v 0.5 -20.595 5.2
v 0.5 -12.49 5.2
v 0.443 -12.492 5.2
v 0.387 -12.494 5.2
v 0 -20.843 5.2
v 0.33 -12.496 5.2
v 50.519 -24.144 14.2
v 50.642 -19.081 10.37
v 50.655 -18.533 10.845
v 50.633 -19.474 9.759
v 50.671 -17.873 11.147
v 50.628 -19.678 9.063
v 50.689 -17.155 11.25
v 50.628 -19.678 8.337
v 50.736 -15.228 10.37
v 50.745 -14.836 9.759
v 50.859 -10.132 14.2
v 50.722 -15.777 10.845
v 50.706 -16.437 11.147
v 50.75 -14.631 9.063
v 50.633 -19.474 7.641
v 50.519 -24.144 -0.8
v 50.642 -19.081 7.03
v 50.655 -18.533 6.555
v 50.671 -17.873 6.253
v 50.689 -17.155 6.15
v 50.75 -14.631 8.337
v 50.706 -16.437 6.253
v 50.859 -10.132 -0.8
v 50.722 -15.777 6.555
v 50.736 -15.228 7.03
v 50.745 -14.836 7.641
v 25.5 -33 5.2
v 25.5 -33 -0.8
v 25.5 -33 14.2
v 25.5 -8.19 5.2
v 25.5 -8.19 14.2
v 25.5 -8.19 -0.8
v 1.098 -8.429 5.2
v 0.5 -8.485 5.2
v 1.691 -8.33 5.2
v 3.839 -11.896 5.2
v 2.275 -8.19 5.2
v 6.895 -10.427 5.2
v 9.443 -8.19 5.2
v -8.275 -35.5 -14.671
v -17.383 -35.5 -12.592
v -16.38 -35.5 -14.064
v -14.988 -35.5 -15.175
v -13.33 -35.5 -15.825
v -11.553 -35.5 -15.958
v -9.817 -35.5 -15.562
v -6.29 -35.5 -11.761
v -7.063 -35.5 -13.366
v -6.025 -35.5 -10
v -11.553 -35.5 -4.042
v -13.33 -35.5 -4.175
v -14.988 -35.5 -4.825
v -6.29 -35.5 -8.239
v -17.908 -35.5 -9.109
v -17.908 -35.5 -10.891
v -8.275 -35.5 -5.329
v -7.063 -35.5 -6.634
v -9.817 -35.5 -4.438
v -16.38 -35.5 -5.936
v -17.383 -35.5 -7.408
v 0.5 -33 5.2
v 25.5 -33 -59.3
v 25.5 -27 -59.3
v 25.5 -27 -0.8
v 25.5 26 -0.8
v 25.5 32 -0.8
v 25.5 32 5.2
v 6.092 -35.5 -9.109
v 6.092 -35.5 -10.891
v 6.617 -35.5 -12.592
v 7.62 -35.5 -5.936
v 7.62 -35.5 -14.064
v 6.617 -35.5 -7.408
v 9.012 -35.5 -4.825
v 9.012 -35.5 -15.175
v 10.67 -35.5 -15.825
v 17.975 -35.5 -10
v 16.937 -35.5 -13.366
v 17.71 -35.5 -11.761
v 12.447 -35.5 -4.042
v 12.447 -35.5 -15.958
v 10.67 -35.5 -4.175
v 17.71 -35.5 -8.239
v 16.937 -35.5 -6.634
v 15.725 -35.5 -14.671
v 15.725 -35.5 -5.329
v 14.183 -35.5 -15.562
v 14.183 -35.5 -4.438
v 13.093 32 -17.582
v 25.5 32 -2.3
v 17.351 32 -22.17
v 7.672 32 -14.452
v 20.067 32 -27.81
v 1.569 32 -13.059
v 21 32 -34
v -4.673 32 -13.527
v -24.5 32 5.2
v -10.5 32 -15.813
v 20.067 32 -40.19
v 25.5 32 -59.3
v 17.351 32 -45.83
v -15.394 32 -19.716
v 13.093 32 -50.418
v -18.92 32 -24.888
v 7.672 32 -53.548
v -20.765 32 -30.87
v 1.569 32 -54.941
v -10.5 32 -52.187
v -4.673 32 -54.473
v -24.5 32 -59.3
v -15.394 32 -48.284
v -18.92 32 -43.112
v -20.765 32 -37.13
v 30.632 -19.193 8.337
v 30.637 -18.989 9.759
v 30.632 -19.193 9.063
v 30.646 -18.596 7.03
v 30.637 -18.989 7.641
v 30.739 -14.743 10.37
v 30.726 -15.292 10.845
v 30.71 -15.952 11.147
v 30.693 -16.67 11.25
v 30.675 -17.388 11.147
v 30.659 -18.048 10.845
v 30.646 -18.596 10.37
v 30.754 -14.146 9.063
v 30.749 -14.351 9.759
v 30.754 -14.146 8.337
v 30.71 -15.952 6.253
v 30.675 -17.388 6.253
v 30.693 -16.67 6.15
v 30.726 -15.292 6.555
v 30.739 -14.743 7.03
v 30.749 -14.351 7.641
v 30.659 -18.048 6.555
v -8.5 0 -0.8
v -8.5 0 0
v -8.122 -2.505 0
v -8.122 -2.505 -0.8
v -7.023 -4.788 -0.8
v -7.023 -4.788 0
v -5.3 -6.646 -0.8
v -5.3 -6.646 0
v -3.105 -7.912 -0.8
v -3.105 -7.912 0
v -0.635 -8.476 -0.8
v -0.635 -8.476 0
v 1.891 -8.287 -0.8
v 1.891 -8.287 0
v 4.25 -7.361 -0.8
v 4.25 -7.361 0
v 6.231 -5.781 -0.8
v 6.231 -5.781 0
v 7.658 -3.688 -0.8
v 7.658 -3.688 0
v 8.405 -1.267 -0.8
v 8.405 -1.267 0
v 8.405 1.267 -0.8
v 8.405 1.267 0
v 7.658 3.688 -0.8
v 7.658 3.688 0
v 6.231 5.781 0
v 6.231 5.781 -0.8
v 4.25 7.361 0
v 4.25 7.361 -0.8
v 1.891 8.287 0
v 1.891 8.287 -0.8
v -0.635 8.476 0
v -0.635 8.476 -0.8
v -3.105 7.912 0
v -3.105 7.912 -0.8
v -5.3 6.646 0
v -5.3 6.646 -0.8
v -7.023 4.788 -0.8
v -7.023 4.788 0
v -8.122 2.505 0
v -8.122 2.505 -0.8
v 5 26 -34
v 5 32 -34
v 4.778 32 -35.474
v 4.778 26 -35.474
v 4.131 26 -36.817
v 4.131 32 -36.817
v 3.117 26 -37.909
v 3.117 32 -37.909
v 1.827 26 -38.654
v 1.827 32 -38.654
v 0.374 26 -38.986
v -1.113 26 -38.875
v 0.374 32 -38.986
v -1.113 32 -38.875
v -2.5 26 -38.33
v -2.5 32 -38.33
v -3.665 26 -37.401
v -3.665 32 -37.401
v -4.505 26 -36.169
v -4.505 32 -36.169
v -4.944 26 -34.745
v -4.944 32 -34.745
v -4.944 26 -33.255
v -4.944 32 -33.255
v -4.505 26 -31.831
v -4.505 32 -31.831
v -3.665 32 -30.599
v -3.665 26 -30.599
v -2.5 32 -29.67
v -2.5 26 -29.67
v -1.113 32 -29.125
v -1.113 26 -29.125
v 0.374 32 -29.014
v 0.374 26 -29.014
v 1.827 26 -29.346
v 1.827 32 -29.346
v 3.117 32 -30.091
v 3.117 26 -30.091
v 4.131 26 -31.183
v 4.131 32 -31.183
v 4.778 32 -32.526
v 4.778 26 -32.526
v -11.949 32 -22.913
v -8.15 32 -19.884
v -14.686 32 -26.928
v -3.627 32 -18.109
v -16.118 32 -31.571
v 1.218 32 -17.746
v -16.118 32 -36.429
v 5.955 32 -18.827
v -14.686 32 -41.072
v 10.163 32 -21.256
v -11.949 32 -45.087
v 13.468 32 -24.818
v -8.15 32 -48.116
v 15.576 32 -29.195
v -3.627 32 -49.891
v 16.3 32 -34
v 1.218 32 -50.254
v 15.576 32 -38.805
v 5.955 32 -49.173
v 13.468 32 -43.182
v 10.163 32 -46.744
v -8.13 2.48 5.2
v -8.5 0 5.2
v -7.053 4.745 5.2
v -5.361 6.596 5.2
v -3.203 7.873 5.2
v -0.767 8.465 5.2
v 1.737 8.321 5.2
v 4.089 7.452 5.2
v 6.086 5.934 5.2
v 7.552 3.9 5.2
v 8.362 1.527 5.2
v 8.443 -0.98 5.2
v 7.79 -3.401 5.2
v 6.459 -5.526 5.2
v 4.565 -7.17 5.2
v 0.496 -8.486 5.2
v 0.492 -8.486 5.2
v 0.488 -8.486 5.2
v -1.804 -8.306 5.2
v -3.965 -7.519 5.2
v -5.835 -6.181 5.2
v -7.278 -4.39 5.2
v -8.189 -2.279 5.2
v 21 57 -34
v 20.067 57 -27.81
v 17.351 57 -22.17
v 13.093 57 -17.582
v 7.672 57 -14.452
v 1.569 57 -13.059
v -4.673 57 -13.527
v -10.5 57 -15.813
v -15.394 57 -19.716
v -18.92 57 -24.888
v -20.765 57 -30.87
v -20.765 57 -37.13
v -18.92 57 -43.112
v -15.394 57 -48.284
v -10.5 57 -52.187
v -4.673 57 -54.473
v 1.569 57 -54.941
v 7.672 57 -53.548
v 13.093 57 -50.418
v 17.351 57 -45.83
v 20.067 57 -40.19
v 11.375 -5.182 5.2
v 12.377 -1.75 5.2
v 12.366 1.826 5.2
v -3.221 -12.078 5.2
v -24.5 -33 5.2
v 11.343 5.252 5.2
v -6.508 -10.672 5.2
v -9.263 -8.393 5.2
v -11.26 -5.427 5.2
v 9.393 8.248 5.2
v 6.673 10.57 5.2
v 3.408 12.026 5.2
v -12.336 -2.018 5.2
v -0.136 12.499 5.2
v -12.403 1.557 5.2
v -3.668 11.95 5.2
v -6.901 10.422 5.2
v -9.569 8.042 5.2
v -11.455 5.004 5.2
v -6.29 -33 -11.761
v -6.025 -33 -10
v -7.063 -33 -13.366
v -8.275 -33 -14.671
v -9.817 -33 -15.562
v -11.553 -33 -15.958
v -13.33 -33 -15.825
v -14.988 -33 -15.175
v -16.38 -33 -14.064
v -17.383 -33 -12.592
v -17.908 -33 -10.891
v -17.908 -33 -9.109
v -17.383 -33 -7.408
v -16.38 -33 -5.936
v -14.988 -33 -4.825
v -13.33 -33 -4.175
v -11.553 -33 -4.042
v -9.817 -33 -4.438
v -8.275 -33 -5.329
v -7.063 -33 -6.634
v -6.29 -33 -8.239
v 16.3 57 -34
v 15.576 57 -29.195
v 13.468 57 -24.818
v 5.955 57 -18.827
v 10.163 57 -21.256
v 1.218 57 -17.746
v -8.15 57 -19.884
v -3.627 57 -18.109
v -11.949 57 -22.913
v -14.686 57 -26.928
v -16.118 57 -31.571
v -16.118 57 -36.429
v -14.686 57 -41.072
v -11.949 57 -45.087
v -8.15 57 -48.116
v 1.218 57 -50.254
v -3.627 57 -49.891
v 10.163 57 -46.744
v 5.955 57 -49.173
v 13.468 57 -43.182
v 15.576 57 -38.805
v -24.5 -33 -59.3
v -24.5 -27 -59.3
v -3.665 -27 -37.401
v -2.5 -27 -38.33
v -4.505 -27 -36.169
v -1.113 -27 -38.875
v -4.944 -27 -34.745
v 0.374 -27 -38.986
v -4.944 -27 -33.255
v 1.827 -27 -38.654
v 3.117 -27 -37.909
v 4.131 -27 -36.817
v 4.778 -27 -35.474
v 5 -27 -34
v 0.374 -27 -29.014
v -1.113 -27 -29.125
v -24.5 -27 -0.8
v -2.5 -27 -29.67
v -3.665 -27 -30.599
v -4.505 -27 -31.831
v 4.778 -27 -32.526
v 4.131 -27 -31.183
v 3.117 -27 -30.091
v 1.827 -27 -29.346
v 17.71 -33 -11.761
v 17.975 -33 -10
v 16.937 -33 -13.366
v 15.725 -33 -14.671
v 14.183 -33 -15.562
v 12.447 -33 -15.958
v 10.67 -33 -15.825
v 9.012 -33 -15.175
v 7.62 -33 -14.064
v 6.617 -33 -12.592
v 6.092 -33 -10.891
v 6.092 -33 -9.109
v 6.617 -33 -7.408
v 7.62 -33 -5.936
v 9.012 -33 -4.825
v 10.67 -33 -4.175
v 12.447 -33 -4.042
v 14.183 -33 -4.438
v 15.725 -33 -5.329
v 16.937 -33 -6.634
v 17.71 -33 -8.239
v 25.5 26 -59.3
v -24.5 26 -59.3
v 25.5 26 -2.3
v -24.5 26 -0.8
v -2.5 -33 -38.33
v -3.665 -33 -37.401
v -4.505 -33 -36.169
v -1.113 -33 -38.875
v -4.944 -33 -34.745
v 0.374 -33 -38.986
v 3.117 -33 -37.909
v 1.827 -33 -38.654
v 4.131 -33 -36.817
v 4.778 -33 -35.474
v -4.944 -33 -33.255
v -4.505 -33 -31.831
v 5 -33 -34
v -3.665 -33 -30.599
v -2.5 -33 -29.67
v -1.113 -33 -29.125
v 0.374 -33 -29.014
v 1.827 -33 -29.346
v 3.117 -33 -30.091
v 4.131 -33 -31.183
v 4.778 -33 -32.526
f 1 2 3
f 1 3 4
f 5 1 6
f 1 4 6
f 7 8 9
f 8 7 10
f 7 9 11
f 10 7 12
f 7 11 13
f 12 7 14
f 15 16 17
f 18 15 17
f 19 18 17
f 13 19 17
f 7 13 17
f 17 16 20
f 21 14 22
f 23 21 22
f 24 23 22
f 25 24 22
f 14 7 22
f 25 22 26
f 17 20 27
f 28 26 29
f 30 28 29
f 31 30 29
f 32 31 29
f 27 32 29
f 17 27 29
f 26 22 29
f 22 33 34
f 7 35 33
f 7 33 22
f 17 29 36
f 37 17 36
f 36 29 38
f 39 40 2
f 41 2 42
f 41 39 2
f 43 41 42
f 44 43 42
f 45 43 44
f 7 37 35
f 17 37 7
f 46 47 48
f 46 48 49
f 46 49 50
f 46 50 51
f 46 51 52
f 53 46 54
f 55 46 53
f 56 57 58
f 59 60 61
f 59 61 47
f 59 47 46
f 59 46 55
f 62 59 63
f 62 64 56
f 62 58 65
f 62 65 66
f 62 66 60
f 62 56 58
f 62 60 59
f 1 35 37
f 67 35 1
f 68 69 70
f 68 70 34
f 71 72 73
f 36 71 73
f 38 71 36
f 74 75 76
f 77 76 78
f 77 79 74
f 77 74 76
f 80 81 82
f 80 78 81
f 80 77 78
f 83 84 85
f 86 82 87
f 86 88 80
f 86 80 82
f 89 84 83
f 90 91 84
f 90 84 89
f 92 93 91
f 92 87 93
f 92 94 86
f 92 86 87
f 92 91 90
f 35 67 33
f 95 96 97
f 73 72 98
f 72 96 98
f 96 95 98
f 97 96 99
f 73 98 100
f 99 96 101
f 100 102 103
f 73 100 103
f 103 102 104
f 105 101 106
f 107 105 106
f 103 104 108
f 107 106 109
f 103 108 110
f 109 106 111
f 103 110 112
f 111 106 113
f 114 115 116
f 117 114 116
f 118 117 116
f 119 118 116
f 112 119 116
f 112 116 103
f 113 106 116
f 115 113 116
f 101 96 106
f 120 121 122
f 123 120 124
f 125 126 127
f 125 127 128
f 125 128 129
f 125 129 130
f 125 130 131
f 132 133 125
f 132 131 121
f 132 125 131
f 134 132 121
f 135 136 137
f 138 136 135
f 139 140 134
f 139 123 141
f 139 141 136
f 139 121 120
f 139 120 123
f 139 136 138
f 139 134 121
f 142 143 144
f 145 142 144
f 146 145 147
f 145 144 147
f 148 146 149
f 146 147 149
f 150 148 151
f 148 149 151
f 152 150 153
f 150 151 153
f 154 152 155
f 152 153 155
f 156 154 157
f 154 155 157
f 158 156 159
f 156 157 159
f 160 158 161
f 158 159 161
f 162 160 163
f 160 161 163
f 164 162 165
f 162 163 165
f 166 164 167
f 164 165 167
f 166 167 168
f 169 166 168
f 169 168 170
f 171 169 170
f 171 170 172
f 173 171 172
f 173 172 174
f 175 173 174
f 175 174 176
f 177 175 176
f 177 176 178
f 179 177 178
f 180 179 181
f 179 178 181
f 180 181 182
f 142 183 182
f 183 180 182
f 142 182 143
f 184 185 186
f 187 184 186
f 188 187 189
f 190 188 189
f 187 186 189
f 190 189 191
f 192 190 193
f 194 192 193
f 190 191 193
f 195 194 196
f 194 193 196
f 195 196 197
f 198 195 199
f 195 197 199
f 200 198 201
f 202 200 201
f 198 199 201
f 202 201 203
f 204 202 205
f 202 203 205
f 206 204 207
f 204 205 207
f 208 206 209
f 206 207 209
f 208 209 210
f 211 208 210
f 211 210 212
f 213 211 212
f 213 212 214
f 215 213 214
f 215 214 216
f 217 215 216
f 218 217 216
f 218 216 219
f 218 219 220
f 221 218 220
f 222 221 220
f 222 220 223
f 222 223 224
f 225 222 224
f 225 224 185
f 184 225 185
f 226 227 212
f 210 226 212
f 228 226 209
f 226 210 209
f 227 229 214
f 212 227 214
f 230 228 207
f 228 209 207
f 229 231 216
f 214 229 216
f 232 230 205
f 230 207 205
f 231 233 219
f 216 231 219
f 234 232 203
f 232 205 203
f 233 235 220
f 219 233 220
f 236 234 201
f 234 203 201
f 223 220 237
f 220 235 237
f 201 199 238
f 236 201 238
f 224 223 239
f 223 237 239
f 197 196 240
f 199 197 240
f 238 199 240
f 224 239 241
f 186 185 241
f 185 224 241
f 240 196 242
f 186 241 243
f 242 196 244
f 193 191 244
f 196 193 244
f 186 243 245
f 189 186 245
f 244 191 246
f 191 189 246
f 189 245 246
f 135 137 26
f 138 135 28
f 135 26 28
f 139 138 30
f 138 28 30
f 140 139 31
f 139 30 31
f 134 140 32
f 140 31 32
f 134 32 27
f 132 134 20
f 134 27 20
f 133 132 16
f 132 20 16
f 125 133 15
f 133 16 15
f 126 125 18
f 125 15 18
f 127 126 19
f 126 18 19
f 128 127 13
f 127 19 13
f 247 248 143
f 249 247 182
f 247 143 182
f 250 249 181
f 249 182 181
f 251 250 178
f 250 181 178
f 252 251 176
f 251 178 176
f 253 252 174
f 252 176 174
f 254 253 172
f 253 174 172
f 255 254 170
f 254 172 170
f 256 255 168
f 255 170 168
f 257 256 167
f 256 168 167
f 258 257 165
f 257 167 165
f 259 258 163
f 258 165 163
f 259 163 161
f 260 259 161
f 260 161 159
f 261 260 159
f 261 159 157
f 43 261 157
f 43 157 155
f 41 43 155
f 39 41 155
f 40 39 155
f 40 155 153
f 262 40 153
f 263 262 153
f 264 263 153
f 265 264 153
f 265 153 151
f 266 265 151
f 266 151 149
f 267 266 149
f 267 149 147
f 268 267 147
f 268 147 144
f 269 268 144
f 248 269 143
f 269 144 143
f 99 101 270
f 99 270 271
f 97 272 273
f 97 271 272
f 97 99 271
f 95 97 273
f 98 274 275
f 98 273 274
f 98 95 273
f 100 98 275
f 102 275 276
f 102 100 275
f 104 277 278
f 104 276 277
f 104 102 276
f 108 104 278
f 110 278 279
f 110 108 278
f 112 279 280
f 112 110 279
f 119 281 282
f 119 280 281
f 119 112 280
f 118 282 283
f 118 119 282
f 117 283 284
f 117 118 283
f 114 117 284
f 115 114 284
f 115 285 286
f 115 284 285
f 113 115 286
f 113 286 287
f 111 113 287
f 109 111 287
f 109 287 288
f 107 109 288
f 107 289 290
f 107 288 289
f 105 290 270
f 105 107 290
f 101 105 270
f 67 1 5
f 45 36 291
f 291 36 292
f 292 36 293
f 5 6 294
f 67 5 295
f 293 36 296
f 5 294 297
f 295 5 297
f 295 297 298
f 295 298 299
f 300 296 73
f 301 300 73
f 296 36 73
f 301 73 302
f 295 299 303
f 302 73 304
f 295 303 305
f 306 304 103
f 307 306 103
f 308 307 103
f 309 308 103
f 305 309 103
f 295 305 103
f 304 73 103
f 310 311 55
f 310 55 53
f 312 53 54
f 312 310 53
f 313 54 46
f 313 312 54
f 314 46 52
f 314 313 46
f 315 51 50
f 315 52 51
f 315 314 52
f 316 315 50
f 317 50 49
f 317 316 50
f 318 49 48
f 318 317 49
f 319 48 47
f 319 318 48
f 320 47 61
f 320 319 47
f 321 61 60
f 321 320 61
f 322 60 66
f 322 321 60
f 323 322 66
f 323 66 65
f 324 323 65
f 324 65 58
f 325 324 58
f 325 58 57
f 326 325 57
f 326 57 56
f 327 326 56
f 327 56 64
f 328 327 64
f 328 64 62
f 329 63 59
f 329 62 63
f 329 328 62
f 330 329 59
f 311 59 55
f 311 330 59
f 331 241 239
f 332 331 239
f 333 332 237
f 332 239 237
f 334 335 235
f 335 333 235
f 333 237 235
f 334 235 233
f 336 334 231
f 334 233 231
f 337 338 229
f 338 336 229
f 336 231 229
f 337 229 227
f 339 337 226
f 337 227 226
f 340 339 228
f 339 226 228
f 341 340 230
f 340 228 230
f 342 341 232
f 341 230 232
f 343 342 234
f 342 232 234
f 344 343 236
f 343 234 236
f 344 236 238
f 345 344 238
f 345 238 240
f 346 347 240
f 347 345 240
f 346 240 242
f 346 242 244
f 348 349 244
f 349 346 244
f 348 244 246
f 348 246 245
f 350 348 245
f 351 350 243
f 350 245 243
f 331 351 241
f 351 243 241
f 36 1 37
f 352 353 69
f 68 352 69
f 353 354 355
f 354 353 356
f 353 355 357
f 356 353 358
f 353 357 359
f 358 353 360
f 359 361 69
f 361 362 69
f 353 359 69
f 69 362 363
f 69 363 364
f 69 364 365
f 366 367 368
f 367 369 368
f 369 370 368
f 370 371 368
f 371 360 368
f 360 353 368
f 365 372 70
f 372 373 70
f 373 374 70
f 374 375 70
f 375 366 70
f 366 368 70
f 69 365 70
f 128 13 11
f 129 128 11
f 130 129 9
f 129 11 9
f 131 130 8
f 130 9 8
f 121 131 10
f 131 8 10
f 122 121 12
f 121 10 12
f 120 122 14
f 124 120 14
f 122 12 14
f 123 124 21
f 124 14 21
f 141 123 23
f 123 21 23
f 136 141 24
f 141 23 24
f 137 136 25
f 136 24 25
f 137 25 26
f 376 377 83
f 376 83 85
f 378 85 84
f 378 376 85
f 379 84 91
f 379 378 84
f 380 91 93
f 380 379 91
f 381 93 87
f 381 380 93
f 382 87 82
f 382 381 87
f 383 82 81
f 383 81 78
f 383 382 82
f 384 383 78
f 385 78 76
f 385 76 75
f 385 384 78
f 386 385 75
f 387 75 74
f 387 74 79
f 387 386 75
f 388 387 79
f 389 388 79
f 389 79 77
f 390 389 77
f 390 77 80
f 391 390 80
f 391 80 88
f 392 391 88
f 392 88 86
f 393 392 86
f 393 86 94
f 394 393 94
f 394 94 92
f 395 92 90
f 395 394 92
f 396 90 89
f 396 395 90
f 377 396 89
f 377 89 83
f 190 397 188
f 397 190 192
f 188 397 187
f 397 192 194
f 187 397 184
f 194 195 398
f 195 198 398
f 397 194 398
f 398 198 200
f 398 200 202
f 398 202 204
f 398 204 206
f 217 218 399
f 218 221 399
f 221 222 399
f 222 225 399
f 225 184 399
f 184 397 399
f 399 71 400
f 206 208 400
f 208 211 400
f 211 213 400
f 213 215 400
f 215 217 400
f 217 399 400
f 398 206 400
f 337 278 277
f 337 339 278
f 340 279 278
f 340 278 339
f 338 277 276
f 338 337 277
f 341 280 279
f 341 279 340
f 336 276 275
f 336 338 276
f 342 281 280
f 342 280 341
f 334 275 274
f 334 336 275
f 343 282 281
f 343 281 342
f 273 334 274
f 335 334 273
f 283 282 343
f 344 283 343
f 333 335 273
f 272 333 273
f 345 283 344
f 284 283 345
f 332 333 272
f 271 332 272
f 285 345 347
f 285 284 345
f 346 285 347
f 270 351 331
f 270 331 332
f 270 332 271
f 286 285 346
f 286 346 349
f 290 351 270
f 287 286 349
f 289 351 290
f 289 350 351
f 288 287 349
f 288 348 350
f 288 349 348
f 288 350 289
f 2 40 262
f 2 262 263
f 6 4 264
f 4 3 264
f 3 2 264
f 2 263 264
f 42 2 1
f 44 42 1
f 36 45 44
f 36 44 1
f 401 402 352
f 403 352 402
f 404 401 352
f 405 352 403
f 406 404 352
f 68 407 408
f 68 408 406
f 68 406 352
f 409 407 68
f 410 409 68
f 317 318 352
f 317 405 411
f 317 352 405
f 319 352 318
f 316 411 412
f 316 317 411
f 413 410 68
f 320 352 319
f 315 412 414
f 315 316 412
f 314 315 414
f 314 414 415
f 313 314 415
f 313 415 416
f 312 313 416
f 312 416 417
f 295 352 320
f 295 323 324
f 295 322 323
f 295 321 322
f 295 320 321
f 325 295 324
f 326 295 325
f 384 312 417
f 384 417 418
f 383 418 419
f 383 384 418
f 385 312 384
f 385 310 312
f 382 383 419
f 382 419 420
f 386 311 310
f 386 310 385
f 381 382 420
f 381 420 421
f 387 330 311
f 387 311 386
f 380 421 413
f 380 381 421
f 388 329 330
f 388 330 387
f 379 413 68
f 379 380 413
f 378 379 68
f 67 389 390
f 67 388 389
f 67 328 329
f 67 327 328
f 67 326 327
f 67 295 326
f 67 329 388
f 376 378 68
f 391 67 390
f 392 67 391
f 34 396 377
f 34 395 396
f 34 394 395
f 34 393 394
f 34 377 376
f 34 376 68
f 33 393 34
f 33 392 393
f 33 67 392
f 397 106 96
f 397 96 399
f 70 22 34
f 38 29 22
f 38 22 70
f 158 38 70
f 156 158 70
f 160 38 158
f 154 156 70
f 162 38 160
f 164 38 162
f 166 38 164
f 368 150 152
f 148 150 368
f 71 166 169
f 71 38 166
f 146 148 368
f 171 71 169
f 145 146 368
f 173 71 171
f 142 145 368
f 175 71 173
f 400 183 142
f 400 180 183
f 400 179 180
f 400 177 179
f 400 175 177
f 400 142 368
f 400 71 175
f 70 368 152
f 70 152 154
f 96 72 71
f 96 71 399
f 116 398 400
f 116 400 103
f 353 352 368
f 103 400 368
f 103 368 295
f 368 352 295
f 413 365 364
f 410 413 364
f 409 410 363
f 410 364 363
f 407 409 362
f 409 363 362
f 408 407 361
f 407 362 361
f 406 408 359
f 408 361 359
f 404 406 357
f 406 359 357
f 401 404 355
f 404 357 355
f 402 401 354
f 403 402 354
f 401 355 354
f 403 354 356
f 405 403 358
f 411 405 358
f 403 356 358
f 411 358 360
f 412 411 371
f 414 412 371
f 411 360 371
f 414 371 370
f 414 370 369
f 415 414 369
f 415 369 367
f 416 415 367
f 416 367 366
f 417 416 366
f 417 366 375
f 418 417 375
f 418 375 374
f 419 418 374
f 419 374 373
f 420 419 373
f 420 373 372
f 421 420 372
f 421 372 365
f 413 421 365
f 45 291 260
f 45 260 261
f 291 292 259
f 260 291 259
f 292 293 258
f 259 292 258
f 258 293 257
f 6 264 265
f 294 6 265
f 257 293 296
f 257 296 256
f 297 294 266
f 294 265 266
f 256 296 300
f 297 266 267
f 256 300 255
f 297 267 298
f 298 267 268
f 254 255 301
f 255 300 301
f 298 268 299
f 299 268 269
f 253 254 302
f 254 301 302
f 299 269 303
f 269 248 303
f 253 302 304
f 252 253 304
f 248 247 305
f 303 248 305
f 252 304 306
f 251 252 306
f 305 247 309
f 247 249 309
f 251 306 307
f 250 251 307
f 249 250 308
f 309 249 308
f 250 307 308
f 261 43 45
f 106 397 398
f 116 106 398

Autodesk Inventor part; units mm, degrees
sketch "Sketch1" plane through (0, 0, 0) normal (0, 0, 1) x (1, 0, 0)
  line L0 (25.5, -27) -> (-25.5, -27)
  line L1 (-25.5, -27) -> (-25.5, 27)
  line L2 (-25.5, 27) -> (25.5, 27)
  line L3 (25.5, 27) -> (25.5, -27)
  line L4 (25.5, -27) -> (-25.5, 27) construction
  line L5 (-25.5, -27) -> (25.5, 27) construction
  point P0 (0, 0)
  dimension "d0" = 51
  dimension "d1" = 54
extrude "Extrusion1" add sketch "Sketch1" along normal blind 6
sketch "Sketch2" plane through (0, 0, 6) normal (0, 0, 1) x (1, 0, 0)
  circle A0 centre (0, 0) radius 15
  dimension "d4" = 30
sketch "Sketch4" plane through (0, 0, 6) normal (0, 0, 1) x (1, 0, 0)
  line L0 (-25.5, 27) -> (26.5, 27)
  line L1 (-25.5, -27) -> (25.5, -27) projected
  line L2 (25.5, -27) -> (-25.5, -27)
  line L3 (-25.5, -27) -> (-25.5, -33)
  line L4 (-25.5, -33) -> (25.5, -33)
  line L5 (25.5, -33) -> (25.5, -27)
  point P0 (0, 0)
  dimension "d109" = 51
  dimension "d110" = 6
extrude "Extrusion4" add sketch "Sketch4" against normal blind 65.3
ref_plane "Plano de trabajo8" through (25.5, -33.8, -42) normal (1, 0, 0) x (0, 0, -1)
ref_plane "Work Plane9" through (-10.5, -27, -57) normal (0, 1, 0) x (1, 0, 0)
sketch "Sketch25" plane through (-10.5, -27, -57) normal (0, 1, 0) x (1, 0, 0)
  line L0 (0, 0) -> (21, 0) projected
  line L1 (10.5, 0) -> (10.5, -23)
  circle A0 centre (10.5, -23) radius 5
  line L2 (10.5, -23) -> (10.5, -63)
  line L3 (36, -63) -> (-15, -63) projected
  point P0 (10.5, -57)
  dimension "d111" = 23
  dimension "d112" = 10
extrude "Extrusion22" cut sketch "Sketch25" against normal blind 68
ref_plane "Work Plane7" through (-10.5, -0.5, -57) normal (0, 1, 0) x (1, 0, 0)
mirror "Mirror2" about plane through (-10.5, -0.5, -57) normal (0, 1, 0) of "Extrusion4"
extrude "Extrusión28" cut sketch "Sketch2" against normal blind 10
ref_plane "Work Plane10" through (25.5, -34, -42) normal (1, 0, 0) x (0, 0, -1)
ref_plane "Work Plane11" through (-25.5, -87, 1.3) normal (0, 1, 0) x (1, 0, 0)
sketch "Sketch37" plane through (-25.5, 32, 6) normal (0, 1, 0) x (1, 0, 0)
  circle A0 centre (25.5, 40) radius 5 projected
  point P0 (25.5, 6)
extrude "Extrusion33" cut sketch "Sketch37" against normal blind 68
sketch "Sketch43" plane through (0, 0, 6) normal (0, 0, 1) x (1, 0, 0)
  circle A0 centre (0, 0) radius 10.4895
  circle A1 centre (0, 0) radius 15 projected
  circle A2 centre (0, 0) radius 5
  dimension "d182" = 10
extrude "Extrusion40" add sketch "Sketch43" against normal blind 8.3 contours A0 | A1
sketch "Boceto48" plane through (-25.5, -33, 6) normal (0, -1, 0) x (1, 0, 0)
  point P0 (25.5, -6)
sketch "Boceto49" plane through (-25.5, -33, 6) normal (0, -1, 0) x (1, 0, 0)
  point P0 (25.5, -6)
sketch "Boceto50" plane through (25.5, 26, -59.3) normal (0, 0, -1) x (-1, 0, 0)
  point P0 (25.5, -26)
sketch "Boceto77" plane through (0, 0, 6) normal (0, 0, 1) x (1, 0, 0)
  point P0 (0, 0)
sketch "Boceto84" plane through (25.5, -33, -59.3) normal (1, 0, 0) x (0, 0, -1)
  line L0 (-65.3, 0) -> (-65.3, 65) projected
  line L1 (-65.3, 0) -> (-65.3, 32.3804)
  line L2 (-65.3, 32.3804) -> (-80.5662, 32.3804)
  line L3 (-80.5662, 32.3804) -> (-80.5662, -6.9517)
  line L4 (-80.5662, -6.9517) -> (-65.3, -6.9517)
  line L5 (-65.3, -6.9517) -> (-65.3, 0)
  point P0 (-59.3, 33)
  point P1 (-65.3, 66.9563)
  point P2 (-65.3, 65.9563)
extrude "Extrusión80" cut sketch "Boceto84" along normal mid plane 100
sketch "Boceto85" plane through (0, 0, 0) normal (0, 0, -1) x (-1, 0, 0)
  line L0 (-25.5, -33) -> (-25.5, -4.0448)
  line L1 (-25.5, -27) -> (-25.5, 26) projected
  line L2 (-25.5, -4.0448) -> (-53.9802, -4.6672)
  line L3 (-53.9802, -4.6672) -> (-54.6281, -33.6366)
  line L4 (-54.6281, -33.6366) -> (-25.5, -33)
  point P0 (0, 0)
  point P1 (-25.5, -13.7947)
extrude "Extrusión81" cut sketch "Boceto85" along normal mid plane 100
sketch "Boceto90" plane through (0, 0, 6) normal (0, 0, 1) x (1, 0, 0)
  circle A0 centre (0, 0) radius 5.2249
  circle A1 centre (0, 0) radius 14.4421
extrude "Extrusión86" add sketch "Boceto90" along normal blind 4.7
fillet "Empalme20" radius 2 1 edges at (-14.4421, 0, 6)
sketch "Boceto91" plane through (0, 0, 0) normal (0, 0, -1) x (-1, 0, 0)
  point P0 (0, 0)
sketch "Boceto92" plane through (0, 0, 0) normal (0, 0, -1) x (-1, 0, 0)
  point P0 (0, 0)
sketch "Boceto93" plane through (0, 0, 0) normal (0, 0, -1) x (-1, 0, 0)
  line L0 (-25.5, -27) -> (-25.5, 26) projected
  line L1 (-25.5, 1.3668) -> (-41.5813, 1.3668)
  line L2 (-41.5813, 1.3668) -> (-41.5813, -33)
  line L3 (-25.5, -33) -> (-41.5813, -33)
  line L4 (-25.5, -33) -> (-25.5, 32.9563) projected
  line L5 (-25.5, 1.3668) -> (-25.5, -33)
  point P0 (0, 0)
extrude "Extrusión87" add sketch "Boceto93" against normal blind 8.3
sketch "Boceto94" plane through (0, 0, 6) normal (0, 0, 1) x (1, 0, 0)
  line L0 (41.5813, -33) -> (41.5813, 1.3668) projected
  line L1 (41.5813, 1.3668) -> (41.5813, 35.5236)
  line L2 (-25.5, 32.9563) -> (25.5, 32.9563) projected
  line L3 (25.5, 32.9563) -> (41.5813, 32.9563)
  line L4 (25.5, 32.9563) -> (25.5, 1.3668)
  line L5 (25.5, 1.3668) -> (41.5813, 1.3668)
  point P0 (0, 0)
extrude "Extrusión88" add sketch "Boceto94" against normal blind 8.3
sketch "Boceto95" plane through (0, 0, 6) normal (0, 0, 1) x (1, 0, 0)
  circle A0 centre (37.8913, -24.81) radius 2.6
  line L0 (35.2913, -24.81) -> (37.8913, -24.81)
  point P0 (0, 0)
  point P1 (41.5813, -33)
  dimension "d305" = 5.2
extrude "Extrusión89" cut sketch "Boceto95" against normal blind 8.3
sketch "Boceto97" plane through (-25.5, -33, -59.3) normal (-1, 0, 0) x (0, 0, 1)
  line L0 (59.3, 0) -> (67.6, 0) projected
  line L1 (67.6, 0) -> (89.1392, 0)
  line L2 (89.1392, 0) -> (89.1392, 69.8717)
  line L3 (89.1392, 69.8717) -> (67.6, 69.8717)
  line L4 (67.6, 69.8717) -> (67.6, 0)
  point P0 (59.3, 33)
extrude "Extrusión92" cut sketch "Boceto97" against normal blind 1000
sketch "Boceto98" plane through (-25.5, -33, -59.3) normal (-1, 0, 0) x (0, 0, 1)
  line L0 (59.3, 59) -> (59.3, 6) projected
  line L1 (59.3, 59) -> (58.3, 59) projected
  line L2 (59.3, 6) -> (59.3, 59)
  line L3 (59.3, 59) -> (56.1979, 59)
  line L4 (59.3, 59) -> (0, 59) projected
  line L5 (56.1979, 59) -> (56.1979, 6)
  line L6 (59.3, 6) -> (0, 6) projected
  line L7 (56.1979, 6) -> (59.3, 6)
  line L8 (65.3, 65) -> (0, 65) projected
  line L9 (56.1979, 65) -> (56.1979, 67.4992)
  line L10 (56.1979, 67.4992) -> (67.7631, 67.4992)
  line L11 (67.7631, 67.4992) -> (76.364, 67.4992)
  line L12 (76.364, 67.4992) -> (76.364, -7.6447)
  line L13 (65.3, 0) -> (65.3, 34.3668) projected
  line L14 (65.3, 0) -> (65.3, -7.6447)
  line L15 (65.3, -7.6447) -> (76.364, -7.6447)
  line L16 (65.3, 0) -> (65.3, 65)
  line L17 (65.3, 0) -> (65.3, 65) projected
  line L18 (56.1979, 65) -> (65.3, 65)
  point P0 (59.3, 33)
  point P1 (59.3, 51.8098)
  point P2 (58.3, 65)
  point P3 (65.3, 65.9563)
  point P4 (59.3, 51.8098)
  point P5 (58.3, 65)
  point P6 (65.3, 34.3668)
extrude "Extrusión93" cut sketch "Boceto98" along normal mid plane 1000
sketch "Boceto99" plane through (41.5813, -33, 0) normal (1, 0, 0) x (0, 0, -1)
  line L0 (0, 58.9816) -> (2.3, 58.9816)
  line L1 (2.3, 65) -> (2.3, 59) projected
  line L2 (2.3, 58.9816) -> (2.3, 65)
  line L3 (2.3, 65) -> (2.3, 58.9816)
  line L4 (2.3, 65) -> (0, 65)
  line L5 (-6, 65) -> (59.3, 65) projected
  line L6 (0, 58.9816) -> (0, 65)
  point P0 (0, 33)
extrude "Extrusión94" cut sketch "Boceto99" against normal blind 16.081
sketch "Boceto100" plane through (25.5, 26, -59.3) normal (0, 0, -1) x (-1, 0, 0)
  line L0 (-16.0813, 6) -> (-0.0003, 6) projected
  line L1 (0, 0) -> (-16.0813, 0)
  line L2 (-16.0813, 0) -> (-16.0813, 6)
  line L3 (-16.0813, 6) -> (0, 6)
  line L4 (0, 6) -> (0, 0)
  point P0 (25.5, -26)
  point P1 (-0.0003, 6)
extrude "Extrusión95" cut sketch "Boceto100" against normal blind 59.3
sketch "Boceto101" plane through (0, 0, 0) normal (0, 0, -1) x (-1, 0, 0)
  circle A0 centre (0, 0) radius 8.5
  dimension "d322" = 17
extrude "Extrusión96" cut sketch "Boceto101" against normal blind 59.3
sketch "Boceto102" plane through (-25.5, 32, -59.3) normal (0, 1, 0) x (1, 0, 0)
  circle A0 centre (25.5, -25.3) radius 5 projected
  circle A1 centre (25.5, -25.3) radius 16.3
  circle A2 centre (25.5, -25.3) radius 21
  point P0 (25.5, -59.3)
  dimension "d325" = 32.6
  dimension "d326" = 42
extrude "Extrusión97" add sketch "Boceto102" along normal blind 25 contours A2
sketch "Boceto103" plane through (-25.5, -27, -59.3) normal (0, 1, 0) x (1, 0, 0)
  point P0 (25.5, -59.3)
sketch "Boceto104" plane through (0, 0, 6) normal (0, 0, 1) x (1, 0, 0)
  line L0 (-25.5, -33) -> (-25.5, 32) projected
  line L1 (41.5813, 32) -> (41.5813, -33) projected
  line L2 (-25.5, 32) -> (41.5813, 32)
  line L3 (41.5813, 32) -> (41.5813, -33)
  line L4 (41.5813, -33) -> (-25.5, -33)
  line L5 (-25.5, -33) -> (-25.5, 32)
  point P0 (0, 0)
extrude "Extrusión98" cut sketch "Boceto104" against normal blind 0.8
sketch "Boceto105" plane through (0, 0, 0) normal (0, 0, -1) x (-1, 0, 0)
  line L0 (-25.5, -33) -> (25.5, -33) projected
  line L1 (-41.5813, 32) -> (25.5, 32)
  line L2 (25.5, 32) -> (25.5, -33)
  line L3 (25.5, -33) -> (-41.5813, -33)
  line L4 (-41.5813, -33) -> (-41.5813, 32)
  circle A0 centre (-37.8913, -24.81) radius 2.6 projected
  circle A1 centre (-37.8913, -24.81) radius 2.6
  circle A2 centre (0, 0) radius 8.5
extrude "Extrusión99" add sketch "Boceto105" along normal blind 0.8
sketch "Boceto106" plane through (-25.5, -33, -59.3) normal (0, -1, 0) x (1, 0, 0)
  line L0 (0, 0) -> (51, 0) projected
  line L1 (67.0813, 64.5) -> (0, 64.5) projected
  line L2 (0, 0) -> (1, 0)
  line L3 (1, 0) -> (1, 64.5)
  line L4 (1, 64.5) -> (0, 64.5)
  line L5 (0, 64.5) -> (0, 0)
  point P0 (25.5, 59.3)
  point P1 (0, 64.5)
  point P2 (1, 0)
  dimension "d333" = 1
extrude "Extrusión100" cut sketch "Boceto106" against normal blind 1000
sketch "Boceto107" plane through (0, 0, -0.8) normal (0, 0, -1) x (-1, 0, 0)
  line L0 (-25.5, -33) -> (-25.5, -38.9196)
  line L1 (-25.5, -38.9196) -> (-33.0828, -52.767)
  line L2 (-33.0828, -52.767) -> (-34.3078, -45.7968) construction
  line L3 (-41.5813, -33) -> (24.5, -33) projected
  spline S0 degree 3 poles (-33.0828, -52.767) (-34.3078, -45.7968) (-36.0426, -41.6296) (-38.17, -38.0712) knots 1 1 1 1 1.670244 1.670244 1.670244 1.670244
  line L4 (-41.5813, 32) -> (-41.5813, -33) projected
  line L5 (-37.8729, -38.2076) -> (-46.4829, -34.2556)
  line L6 (-46.4829, -34.2556) -> (-46.4829, 32)
  line L7 (-46.4829, 32) -> (-41.5813, 32)
  line L8 (-34.3078, -45.7968) -> (-36.0426, -41.6296) construction
  line L9 (-36.0426, -41.6296) -> (-38.17, -38.0712) construction
  point P0 (0, 0)
extrude "Extrusión101" add sketch "Boceto107" against normal blind 6
fillet "Empalme21" radius 2 2 edges at (38.17, -38.0712, 2.2) (46.4829, -34.2556, 2.2)
sketch "Boceto108" plane through (-24.5, -33, 5.2) normal (0, -1, 0) x (1, 0, 0)
  circle A0 centre (24.5, -39.2) radius 5 projected
  line L0 (24.5, -39.2) -> (24.5, -15.2)
  line L1 (50, -6) -> (0, -6) projected
  line L2 (24.5, -15.2) -> (32.2045, -6)
  line L3 (32.2045, -6) -> (24.5, -15.2)
  line L4 (24.5, -15.2) -> (36.5, -15.2)
  line L5 (36.5, -15.2) -> (12.5, -15.2)
  circle A1 centre (36.5, -15.2) radius 5.975
  circle A2 centre (12.5, -15.2) radius 5.975
  point P0 (24.5, -5.2)
  dimension "d340" = 24
  dimension "d341" = 12
  dimension "d342" = 12
  dimension "d343" = 24
  dimension "d344" = 11.95
  dimension "d345" = 11.95
extrude "Extrusión102" add sketch "Boceto108" along normal blind 2.5 contours A1 | A2
sketch "Boceto109" plane through (0, 0, -0.8) normal (0, 0, -1) x (-1, 0, 0)
  line L0 (-45.3172, -34.7906) -> (-38.7421, -37.8086) projected
  line L1 (-45.3172, -34.7906) -> (-49.6596, -32.7974)
  line L2 (-49.6596, -32.7974) -> (-49.6596, 32)
  line L3 (-46.4829, 32) -> (-46.4829, -32.9729) projected
  line L4 (-49.6596, 32) -> (-46.4829, 32)
  arc A0 (-46.4829, -32.9729) -> (-45.3172, -34.7906) centre (-44.4829, -32.9729) ccw projected
  line L5 (-46.4829, 32) -> (-45.3172, -34.7906)
  point P0 (0, 0)
extrude "Extrusión103" add sketch "Boceto109" against normal blind 6 contours L1 L2 L4 L3 A0
fillet "Empalme23" radius 4 2 edges at (49.6596, -32.7974, 2.2) (49.6596, 32, 2.2)
sketch "Boceto110" plane through (0, 0, 5.2) normal (0, 0, 1) x (1, 0, 0)
  line L0 (33.0828, -52.767) -> (25.5, -38.9196) projected
  line L1 (25.5, -38.9196) -> (37.9157, -38.9196)
  line L2 (37.9157, -38.9196) -> (33.0828, -52.767)
  line L3 (33.0828, -52.767) -> (25.5, -38.9196)
  point P0 (0, 0)
extrude "Extrusión104" cut sketch "Boceto110" against normal blind 10
sketch "Sketch111" plane through (0, 0, 5.2) normal (0, 0, 1) x (1, 0, 0)
  line L0 (25.5, -33) -> (25.5, -38.9196) projected
  line L1 (38.7421, -37.8086) -> (47.3283, -33.8675) projected
  line L2 (25.5, -33) -> (47.3283, -33.8675)
  line L3 (37.6774, -38.9196) -> (25.5, -38.9196) projected
  line L4 (25.5, -38.9196) -> (37.6774, -38.9196)
  line L5 (37.6774, -38.9196) -> (38.7421, -37.8086)
  point P0 (0, 0)
extrude "Extrusion105" cut sketch "Sketch111" against normal blind 10
sketch "Sketch114" plane through (0, 0, -0.8) normal (0, 0, -1) x (-1, 0, 0)
  line L0 (-25.5, 32) -> (-25.5, 26) projected
  line L1 (-25.5, 26) -> (-25.5, 32)
  line L2 (-25.5, 32) -> (-25.5, -13.2226)
  line L3 (-25.5, -13.2226) -> (-49.6596, -13.2226)
  line L4 (-49.6596, -30.2322) -> (-49.6596, 28) projected
  line L5 (-49.6596, 28) -> (-49.6596, -30.2322) projected
  line L6 (-49.6596, -13.2226) -> (-49.6596, 28)
  line L7 (-25.5, 32) -> (-45.6596, 32) projected
  arc A0 (-45.6596, 32) -> (-49.6596, 28) centre (-45.6596, 28) ccw projected
  arc A1 (-45.6596, 32) -> (-49.6596, 28) centre (-45.6596, 28) ccw
  line L8 (-45.6596, 32) -> (-25.5, 32)
  point P0 (0, 0)
extrude "Extrusion108" cut sketch "Sketch114" against normal blind 6
sketch "Sketch115" plane through (0, 0, -59.3) normal (0, 0, -1) x (-1, 0, 0)
  line L0 (-50.9952, -38.1245) -> (29.0048, -38.1245)
  line L1 (29.0048, -38.1245) -> (29.0048, 81.8755)
  line L2 (29.0048, 81.8755) -> (-50.9952, 81.8755)
  line L3 (-50.9952, 81.8755) -> (-50.9952, -38.1245)
  point P0 (0, 0)
  dimension "d363" = 80
  dimension "d364" = 120
sketch "Sketch116" plane through (0, 0, 5.2) normal (0, 0, 1) x (1, 0, 0)
  line L0 (25.5, -33) -> (-24.5, -33) projected
  line L1 (25.5, -33) -> (50.5194, -24.1438)
  line L2 (50.5194, -24.1438) -> (50.8592, -10.1321)
  line L3 (50.8592, -10.1321) -> (25.5, -8.1902)
  line L4 (25.5, 26) -> (25.5, -13.2226) projected
  line L5 (25.5, -27) -> (25.5, -33) projected
  line L6 (25.5, -33) -> (25.5, -8.1902)
  line L7 (25.5, -33) -> (62.3665, -33)
  line L8 (62.3665, -33) -> (62.3665, 19.7655)
  line L9 (62.3665, 19.7655) -> (25.5, 19.7655)
  line L10 (25.5, 19.7655) -> (25.5, -33)
  line L11 (62.3665, 19.7655) -> (25.5, 19.7655)
  line L12 (25.5, 19.7655) -> (25.5, -84.5573)
  line L13 (25.5, -84.5573) -> (62.3665, -84.5573)
  line L14 (62.3665, -84.5573) -> (62.3665, 19.7655)
  point P0 (0, 0)
extrude "Extrusion109" add sketch "Sketch116" along normal blind 9 and the other way blind 6 contours L5 L6 L4 L3 L2 L1
sketch "Sketch117" plane through (50.8592, -10.1321, 14.2) normal (0.9997061, -0.0242446, 0) x (0, 0, -1)
  line L0 (1.2948, -7.0247) -> (1.2483, -7.0247)
  line L1 (0, 1.3265) -> (0, -23.476) projected
  line L2 (9, -23.476) -> (9, 1.3265) projected
  circle A0 centre (5.5, -7.0247) radius 2.55
  line L3 (0, -7.0247) -> (5.5, -7.0247)
  point P0 (14.2, 8.896)
  dimension "d387" = 5.5
  dimension "d388" = 5.1
extrude "Extrusion111" cut sketch "Sketch116" against normal blind 20 contours L1 L2 L3 L4 L9 L8 L7 | L7 L14 L13 L12
sketch "Sketch118" plane through (-24.5, -33, -59.3) normal (0, -1, 0) x (1, 0, 0)
  line L0 (75.3592, 73.5) -> (50, 73.5) projected
  line L1 (50, 64.5) -> (50, 73.5) projected
  line L2 (50, 73.5) -> (50, 64.5)
  line L3 (50, 64.5) -> (25, 64.5)
  line L4 (50, 73.5) -> (25, 64.5)
  point P0 (24.5, 59.3)
  dimension "d373" = 25
extrude "Extrusion112" add sketch "Sketch118" against normal blind 24.81
sketch "Sketch119" plane through (0, 0, 5.2) normal (0, 0, 1) x (1, 0, 0)
  circle A0 centre (0, 0) radius 12.5
  dimension "d376" = 25
extrude "Extrusion113" cut sketch "Sketch119" along normal blind 24.81
sketch "Sketch120" plane through (0, 0, 5.2) normal (0, 0, 1) x (1, 0, 0)
  line L0 (0.5, -33) -> (0.5, -12.49) projected
  line L1 (0.5, -33) -> (0.5, -20.595)
  line L2 (25.5, -8.1902) -> (25.5, -8.19) projected
  line L3 (0.5, -20.595) -> (25.5, -8.19)
  line L4 (25.5, -8.19) -> (0.5, -8.19)
  line L5 (0.5, -8.19) -> (0, -20.8431)
  line L6 (0, -20.8431) -> (0.5, -20.595)
  point P0 (0, 0)
  dimension "d379" = 12.405
extrude "Extrusion114" cut sketch "Sketch120" along normal blind 24.81
extrude "Extrusion115" cut sketch "Sketch117" against normal blind 20
ref_plane "Work Plane3" through (-10.35, 26, -57) normal (0, 1, 0) x (1, 0, 0)
properties part number "C23[i3][L][T1]" material "Aluminum 6061"
